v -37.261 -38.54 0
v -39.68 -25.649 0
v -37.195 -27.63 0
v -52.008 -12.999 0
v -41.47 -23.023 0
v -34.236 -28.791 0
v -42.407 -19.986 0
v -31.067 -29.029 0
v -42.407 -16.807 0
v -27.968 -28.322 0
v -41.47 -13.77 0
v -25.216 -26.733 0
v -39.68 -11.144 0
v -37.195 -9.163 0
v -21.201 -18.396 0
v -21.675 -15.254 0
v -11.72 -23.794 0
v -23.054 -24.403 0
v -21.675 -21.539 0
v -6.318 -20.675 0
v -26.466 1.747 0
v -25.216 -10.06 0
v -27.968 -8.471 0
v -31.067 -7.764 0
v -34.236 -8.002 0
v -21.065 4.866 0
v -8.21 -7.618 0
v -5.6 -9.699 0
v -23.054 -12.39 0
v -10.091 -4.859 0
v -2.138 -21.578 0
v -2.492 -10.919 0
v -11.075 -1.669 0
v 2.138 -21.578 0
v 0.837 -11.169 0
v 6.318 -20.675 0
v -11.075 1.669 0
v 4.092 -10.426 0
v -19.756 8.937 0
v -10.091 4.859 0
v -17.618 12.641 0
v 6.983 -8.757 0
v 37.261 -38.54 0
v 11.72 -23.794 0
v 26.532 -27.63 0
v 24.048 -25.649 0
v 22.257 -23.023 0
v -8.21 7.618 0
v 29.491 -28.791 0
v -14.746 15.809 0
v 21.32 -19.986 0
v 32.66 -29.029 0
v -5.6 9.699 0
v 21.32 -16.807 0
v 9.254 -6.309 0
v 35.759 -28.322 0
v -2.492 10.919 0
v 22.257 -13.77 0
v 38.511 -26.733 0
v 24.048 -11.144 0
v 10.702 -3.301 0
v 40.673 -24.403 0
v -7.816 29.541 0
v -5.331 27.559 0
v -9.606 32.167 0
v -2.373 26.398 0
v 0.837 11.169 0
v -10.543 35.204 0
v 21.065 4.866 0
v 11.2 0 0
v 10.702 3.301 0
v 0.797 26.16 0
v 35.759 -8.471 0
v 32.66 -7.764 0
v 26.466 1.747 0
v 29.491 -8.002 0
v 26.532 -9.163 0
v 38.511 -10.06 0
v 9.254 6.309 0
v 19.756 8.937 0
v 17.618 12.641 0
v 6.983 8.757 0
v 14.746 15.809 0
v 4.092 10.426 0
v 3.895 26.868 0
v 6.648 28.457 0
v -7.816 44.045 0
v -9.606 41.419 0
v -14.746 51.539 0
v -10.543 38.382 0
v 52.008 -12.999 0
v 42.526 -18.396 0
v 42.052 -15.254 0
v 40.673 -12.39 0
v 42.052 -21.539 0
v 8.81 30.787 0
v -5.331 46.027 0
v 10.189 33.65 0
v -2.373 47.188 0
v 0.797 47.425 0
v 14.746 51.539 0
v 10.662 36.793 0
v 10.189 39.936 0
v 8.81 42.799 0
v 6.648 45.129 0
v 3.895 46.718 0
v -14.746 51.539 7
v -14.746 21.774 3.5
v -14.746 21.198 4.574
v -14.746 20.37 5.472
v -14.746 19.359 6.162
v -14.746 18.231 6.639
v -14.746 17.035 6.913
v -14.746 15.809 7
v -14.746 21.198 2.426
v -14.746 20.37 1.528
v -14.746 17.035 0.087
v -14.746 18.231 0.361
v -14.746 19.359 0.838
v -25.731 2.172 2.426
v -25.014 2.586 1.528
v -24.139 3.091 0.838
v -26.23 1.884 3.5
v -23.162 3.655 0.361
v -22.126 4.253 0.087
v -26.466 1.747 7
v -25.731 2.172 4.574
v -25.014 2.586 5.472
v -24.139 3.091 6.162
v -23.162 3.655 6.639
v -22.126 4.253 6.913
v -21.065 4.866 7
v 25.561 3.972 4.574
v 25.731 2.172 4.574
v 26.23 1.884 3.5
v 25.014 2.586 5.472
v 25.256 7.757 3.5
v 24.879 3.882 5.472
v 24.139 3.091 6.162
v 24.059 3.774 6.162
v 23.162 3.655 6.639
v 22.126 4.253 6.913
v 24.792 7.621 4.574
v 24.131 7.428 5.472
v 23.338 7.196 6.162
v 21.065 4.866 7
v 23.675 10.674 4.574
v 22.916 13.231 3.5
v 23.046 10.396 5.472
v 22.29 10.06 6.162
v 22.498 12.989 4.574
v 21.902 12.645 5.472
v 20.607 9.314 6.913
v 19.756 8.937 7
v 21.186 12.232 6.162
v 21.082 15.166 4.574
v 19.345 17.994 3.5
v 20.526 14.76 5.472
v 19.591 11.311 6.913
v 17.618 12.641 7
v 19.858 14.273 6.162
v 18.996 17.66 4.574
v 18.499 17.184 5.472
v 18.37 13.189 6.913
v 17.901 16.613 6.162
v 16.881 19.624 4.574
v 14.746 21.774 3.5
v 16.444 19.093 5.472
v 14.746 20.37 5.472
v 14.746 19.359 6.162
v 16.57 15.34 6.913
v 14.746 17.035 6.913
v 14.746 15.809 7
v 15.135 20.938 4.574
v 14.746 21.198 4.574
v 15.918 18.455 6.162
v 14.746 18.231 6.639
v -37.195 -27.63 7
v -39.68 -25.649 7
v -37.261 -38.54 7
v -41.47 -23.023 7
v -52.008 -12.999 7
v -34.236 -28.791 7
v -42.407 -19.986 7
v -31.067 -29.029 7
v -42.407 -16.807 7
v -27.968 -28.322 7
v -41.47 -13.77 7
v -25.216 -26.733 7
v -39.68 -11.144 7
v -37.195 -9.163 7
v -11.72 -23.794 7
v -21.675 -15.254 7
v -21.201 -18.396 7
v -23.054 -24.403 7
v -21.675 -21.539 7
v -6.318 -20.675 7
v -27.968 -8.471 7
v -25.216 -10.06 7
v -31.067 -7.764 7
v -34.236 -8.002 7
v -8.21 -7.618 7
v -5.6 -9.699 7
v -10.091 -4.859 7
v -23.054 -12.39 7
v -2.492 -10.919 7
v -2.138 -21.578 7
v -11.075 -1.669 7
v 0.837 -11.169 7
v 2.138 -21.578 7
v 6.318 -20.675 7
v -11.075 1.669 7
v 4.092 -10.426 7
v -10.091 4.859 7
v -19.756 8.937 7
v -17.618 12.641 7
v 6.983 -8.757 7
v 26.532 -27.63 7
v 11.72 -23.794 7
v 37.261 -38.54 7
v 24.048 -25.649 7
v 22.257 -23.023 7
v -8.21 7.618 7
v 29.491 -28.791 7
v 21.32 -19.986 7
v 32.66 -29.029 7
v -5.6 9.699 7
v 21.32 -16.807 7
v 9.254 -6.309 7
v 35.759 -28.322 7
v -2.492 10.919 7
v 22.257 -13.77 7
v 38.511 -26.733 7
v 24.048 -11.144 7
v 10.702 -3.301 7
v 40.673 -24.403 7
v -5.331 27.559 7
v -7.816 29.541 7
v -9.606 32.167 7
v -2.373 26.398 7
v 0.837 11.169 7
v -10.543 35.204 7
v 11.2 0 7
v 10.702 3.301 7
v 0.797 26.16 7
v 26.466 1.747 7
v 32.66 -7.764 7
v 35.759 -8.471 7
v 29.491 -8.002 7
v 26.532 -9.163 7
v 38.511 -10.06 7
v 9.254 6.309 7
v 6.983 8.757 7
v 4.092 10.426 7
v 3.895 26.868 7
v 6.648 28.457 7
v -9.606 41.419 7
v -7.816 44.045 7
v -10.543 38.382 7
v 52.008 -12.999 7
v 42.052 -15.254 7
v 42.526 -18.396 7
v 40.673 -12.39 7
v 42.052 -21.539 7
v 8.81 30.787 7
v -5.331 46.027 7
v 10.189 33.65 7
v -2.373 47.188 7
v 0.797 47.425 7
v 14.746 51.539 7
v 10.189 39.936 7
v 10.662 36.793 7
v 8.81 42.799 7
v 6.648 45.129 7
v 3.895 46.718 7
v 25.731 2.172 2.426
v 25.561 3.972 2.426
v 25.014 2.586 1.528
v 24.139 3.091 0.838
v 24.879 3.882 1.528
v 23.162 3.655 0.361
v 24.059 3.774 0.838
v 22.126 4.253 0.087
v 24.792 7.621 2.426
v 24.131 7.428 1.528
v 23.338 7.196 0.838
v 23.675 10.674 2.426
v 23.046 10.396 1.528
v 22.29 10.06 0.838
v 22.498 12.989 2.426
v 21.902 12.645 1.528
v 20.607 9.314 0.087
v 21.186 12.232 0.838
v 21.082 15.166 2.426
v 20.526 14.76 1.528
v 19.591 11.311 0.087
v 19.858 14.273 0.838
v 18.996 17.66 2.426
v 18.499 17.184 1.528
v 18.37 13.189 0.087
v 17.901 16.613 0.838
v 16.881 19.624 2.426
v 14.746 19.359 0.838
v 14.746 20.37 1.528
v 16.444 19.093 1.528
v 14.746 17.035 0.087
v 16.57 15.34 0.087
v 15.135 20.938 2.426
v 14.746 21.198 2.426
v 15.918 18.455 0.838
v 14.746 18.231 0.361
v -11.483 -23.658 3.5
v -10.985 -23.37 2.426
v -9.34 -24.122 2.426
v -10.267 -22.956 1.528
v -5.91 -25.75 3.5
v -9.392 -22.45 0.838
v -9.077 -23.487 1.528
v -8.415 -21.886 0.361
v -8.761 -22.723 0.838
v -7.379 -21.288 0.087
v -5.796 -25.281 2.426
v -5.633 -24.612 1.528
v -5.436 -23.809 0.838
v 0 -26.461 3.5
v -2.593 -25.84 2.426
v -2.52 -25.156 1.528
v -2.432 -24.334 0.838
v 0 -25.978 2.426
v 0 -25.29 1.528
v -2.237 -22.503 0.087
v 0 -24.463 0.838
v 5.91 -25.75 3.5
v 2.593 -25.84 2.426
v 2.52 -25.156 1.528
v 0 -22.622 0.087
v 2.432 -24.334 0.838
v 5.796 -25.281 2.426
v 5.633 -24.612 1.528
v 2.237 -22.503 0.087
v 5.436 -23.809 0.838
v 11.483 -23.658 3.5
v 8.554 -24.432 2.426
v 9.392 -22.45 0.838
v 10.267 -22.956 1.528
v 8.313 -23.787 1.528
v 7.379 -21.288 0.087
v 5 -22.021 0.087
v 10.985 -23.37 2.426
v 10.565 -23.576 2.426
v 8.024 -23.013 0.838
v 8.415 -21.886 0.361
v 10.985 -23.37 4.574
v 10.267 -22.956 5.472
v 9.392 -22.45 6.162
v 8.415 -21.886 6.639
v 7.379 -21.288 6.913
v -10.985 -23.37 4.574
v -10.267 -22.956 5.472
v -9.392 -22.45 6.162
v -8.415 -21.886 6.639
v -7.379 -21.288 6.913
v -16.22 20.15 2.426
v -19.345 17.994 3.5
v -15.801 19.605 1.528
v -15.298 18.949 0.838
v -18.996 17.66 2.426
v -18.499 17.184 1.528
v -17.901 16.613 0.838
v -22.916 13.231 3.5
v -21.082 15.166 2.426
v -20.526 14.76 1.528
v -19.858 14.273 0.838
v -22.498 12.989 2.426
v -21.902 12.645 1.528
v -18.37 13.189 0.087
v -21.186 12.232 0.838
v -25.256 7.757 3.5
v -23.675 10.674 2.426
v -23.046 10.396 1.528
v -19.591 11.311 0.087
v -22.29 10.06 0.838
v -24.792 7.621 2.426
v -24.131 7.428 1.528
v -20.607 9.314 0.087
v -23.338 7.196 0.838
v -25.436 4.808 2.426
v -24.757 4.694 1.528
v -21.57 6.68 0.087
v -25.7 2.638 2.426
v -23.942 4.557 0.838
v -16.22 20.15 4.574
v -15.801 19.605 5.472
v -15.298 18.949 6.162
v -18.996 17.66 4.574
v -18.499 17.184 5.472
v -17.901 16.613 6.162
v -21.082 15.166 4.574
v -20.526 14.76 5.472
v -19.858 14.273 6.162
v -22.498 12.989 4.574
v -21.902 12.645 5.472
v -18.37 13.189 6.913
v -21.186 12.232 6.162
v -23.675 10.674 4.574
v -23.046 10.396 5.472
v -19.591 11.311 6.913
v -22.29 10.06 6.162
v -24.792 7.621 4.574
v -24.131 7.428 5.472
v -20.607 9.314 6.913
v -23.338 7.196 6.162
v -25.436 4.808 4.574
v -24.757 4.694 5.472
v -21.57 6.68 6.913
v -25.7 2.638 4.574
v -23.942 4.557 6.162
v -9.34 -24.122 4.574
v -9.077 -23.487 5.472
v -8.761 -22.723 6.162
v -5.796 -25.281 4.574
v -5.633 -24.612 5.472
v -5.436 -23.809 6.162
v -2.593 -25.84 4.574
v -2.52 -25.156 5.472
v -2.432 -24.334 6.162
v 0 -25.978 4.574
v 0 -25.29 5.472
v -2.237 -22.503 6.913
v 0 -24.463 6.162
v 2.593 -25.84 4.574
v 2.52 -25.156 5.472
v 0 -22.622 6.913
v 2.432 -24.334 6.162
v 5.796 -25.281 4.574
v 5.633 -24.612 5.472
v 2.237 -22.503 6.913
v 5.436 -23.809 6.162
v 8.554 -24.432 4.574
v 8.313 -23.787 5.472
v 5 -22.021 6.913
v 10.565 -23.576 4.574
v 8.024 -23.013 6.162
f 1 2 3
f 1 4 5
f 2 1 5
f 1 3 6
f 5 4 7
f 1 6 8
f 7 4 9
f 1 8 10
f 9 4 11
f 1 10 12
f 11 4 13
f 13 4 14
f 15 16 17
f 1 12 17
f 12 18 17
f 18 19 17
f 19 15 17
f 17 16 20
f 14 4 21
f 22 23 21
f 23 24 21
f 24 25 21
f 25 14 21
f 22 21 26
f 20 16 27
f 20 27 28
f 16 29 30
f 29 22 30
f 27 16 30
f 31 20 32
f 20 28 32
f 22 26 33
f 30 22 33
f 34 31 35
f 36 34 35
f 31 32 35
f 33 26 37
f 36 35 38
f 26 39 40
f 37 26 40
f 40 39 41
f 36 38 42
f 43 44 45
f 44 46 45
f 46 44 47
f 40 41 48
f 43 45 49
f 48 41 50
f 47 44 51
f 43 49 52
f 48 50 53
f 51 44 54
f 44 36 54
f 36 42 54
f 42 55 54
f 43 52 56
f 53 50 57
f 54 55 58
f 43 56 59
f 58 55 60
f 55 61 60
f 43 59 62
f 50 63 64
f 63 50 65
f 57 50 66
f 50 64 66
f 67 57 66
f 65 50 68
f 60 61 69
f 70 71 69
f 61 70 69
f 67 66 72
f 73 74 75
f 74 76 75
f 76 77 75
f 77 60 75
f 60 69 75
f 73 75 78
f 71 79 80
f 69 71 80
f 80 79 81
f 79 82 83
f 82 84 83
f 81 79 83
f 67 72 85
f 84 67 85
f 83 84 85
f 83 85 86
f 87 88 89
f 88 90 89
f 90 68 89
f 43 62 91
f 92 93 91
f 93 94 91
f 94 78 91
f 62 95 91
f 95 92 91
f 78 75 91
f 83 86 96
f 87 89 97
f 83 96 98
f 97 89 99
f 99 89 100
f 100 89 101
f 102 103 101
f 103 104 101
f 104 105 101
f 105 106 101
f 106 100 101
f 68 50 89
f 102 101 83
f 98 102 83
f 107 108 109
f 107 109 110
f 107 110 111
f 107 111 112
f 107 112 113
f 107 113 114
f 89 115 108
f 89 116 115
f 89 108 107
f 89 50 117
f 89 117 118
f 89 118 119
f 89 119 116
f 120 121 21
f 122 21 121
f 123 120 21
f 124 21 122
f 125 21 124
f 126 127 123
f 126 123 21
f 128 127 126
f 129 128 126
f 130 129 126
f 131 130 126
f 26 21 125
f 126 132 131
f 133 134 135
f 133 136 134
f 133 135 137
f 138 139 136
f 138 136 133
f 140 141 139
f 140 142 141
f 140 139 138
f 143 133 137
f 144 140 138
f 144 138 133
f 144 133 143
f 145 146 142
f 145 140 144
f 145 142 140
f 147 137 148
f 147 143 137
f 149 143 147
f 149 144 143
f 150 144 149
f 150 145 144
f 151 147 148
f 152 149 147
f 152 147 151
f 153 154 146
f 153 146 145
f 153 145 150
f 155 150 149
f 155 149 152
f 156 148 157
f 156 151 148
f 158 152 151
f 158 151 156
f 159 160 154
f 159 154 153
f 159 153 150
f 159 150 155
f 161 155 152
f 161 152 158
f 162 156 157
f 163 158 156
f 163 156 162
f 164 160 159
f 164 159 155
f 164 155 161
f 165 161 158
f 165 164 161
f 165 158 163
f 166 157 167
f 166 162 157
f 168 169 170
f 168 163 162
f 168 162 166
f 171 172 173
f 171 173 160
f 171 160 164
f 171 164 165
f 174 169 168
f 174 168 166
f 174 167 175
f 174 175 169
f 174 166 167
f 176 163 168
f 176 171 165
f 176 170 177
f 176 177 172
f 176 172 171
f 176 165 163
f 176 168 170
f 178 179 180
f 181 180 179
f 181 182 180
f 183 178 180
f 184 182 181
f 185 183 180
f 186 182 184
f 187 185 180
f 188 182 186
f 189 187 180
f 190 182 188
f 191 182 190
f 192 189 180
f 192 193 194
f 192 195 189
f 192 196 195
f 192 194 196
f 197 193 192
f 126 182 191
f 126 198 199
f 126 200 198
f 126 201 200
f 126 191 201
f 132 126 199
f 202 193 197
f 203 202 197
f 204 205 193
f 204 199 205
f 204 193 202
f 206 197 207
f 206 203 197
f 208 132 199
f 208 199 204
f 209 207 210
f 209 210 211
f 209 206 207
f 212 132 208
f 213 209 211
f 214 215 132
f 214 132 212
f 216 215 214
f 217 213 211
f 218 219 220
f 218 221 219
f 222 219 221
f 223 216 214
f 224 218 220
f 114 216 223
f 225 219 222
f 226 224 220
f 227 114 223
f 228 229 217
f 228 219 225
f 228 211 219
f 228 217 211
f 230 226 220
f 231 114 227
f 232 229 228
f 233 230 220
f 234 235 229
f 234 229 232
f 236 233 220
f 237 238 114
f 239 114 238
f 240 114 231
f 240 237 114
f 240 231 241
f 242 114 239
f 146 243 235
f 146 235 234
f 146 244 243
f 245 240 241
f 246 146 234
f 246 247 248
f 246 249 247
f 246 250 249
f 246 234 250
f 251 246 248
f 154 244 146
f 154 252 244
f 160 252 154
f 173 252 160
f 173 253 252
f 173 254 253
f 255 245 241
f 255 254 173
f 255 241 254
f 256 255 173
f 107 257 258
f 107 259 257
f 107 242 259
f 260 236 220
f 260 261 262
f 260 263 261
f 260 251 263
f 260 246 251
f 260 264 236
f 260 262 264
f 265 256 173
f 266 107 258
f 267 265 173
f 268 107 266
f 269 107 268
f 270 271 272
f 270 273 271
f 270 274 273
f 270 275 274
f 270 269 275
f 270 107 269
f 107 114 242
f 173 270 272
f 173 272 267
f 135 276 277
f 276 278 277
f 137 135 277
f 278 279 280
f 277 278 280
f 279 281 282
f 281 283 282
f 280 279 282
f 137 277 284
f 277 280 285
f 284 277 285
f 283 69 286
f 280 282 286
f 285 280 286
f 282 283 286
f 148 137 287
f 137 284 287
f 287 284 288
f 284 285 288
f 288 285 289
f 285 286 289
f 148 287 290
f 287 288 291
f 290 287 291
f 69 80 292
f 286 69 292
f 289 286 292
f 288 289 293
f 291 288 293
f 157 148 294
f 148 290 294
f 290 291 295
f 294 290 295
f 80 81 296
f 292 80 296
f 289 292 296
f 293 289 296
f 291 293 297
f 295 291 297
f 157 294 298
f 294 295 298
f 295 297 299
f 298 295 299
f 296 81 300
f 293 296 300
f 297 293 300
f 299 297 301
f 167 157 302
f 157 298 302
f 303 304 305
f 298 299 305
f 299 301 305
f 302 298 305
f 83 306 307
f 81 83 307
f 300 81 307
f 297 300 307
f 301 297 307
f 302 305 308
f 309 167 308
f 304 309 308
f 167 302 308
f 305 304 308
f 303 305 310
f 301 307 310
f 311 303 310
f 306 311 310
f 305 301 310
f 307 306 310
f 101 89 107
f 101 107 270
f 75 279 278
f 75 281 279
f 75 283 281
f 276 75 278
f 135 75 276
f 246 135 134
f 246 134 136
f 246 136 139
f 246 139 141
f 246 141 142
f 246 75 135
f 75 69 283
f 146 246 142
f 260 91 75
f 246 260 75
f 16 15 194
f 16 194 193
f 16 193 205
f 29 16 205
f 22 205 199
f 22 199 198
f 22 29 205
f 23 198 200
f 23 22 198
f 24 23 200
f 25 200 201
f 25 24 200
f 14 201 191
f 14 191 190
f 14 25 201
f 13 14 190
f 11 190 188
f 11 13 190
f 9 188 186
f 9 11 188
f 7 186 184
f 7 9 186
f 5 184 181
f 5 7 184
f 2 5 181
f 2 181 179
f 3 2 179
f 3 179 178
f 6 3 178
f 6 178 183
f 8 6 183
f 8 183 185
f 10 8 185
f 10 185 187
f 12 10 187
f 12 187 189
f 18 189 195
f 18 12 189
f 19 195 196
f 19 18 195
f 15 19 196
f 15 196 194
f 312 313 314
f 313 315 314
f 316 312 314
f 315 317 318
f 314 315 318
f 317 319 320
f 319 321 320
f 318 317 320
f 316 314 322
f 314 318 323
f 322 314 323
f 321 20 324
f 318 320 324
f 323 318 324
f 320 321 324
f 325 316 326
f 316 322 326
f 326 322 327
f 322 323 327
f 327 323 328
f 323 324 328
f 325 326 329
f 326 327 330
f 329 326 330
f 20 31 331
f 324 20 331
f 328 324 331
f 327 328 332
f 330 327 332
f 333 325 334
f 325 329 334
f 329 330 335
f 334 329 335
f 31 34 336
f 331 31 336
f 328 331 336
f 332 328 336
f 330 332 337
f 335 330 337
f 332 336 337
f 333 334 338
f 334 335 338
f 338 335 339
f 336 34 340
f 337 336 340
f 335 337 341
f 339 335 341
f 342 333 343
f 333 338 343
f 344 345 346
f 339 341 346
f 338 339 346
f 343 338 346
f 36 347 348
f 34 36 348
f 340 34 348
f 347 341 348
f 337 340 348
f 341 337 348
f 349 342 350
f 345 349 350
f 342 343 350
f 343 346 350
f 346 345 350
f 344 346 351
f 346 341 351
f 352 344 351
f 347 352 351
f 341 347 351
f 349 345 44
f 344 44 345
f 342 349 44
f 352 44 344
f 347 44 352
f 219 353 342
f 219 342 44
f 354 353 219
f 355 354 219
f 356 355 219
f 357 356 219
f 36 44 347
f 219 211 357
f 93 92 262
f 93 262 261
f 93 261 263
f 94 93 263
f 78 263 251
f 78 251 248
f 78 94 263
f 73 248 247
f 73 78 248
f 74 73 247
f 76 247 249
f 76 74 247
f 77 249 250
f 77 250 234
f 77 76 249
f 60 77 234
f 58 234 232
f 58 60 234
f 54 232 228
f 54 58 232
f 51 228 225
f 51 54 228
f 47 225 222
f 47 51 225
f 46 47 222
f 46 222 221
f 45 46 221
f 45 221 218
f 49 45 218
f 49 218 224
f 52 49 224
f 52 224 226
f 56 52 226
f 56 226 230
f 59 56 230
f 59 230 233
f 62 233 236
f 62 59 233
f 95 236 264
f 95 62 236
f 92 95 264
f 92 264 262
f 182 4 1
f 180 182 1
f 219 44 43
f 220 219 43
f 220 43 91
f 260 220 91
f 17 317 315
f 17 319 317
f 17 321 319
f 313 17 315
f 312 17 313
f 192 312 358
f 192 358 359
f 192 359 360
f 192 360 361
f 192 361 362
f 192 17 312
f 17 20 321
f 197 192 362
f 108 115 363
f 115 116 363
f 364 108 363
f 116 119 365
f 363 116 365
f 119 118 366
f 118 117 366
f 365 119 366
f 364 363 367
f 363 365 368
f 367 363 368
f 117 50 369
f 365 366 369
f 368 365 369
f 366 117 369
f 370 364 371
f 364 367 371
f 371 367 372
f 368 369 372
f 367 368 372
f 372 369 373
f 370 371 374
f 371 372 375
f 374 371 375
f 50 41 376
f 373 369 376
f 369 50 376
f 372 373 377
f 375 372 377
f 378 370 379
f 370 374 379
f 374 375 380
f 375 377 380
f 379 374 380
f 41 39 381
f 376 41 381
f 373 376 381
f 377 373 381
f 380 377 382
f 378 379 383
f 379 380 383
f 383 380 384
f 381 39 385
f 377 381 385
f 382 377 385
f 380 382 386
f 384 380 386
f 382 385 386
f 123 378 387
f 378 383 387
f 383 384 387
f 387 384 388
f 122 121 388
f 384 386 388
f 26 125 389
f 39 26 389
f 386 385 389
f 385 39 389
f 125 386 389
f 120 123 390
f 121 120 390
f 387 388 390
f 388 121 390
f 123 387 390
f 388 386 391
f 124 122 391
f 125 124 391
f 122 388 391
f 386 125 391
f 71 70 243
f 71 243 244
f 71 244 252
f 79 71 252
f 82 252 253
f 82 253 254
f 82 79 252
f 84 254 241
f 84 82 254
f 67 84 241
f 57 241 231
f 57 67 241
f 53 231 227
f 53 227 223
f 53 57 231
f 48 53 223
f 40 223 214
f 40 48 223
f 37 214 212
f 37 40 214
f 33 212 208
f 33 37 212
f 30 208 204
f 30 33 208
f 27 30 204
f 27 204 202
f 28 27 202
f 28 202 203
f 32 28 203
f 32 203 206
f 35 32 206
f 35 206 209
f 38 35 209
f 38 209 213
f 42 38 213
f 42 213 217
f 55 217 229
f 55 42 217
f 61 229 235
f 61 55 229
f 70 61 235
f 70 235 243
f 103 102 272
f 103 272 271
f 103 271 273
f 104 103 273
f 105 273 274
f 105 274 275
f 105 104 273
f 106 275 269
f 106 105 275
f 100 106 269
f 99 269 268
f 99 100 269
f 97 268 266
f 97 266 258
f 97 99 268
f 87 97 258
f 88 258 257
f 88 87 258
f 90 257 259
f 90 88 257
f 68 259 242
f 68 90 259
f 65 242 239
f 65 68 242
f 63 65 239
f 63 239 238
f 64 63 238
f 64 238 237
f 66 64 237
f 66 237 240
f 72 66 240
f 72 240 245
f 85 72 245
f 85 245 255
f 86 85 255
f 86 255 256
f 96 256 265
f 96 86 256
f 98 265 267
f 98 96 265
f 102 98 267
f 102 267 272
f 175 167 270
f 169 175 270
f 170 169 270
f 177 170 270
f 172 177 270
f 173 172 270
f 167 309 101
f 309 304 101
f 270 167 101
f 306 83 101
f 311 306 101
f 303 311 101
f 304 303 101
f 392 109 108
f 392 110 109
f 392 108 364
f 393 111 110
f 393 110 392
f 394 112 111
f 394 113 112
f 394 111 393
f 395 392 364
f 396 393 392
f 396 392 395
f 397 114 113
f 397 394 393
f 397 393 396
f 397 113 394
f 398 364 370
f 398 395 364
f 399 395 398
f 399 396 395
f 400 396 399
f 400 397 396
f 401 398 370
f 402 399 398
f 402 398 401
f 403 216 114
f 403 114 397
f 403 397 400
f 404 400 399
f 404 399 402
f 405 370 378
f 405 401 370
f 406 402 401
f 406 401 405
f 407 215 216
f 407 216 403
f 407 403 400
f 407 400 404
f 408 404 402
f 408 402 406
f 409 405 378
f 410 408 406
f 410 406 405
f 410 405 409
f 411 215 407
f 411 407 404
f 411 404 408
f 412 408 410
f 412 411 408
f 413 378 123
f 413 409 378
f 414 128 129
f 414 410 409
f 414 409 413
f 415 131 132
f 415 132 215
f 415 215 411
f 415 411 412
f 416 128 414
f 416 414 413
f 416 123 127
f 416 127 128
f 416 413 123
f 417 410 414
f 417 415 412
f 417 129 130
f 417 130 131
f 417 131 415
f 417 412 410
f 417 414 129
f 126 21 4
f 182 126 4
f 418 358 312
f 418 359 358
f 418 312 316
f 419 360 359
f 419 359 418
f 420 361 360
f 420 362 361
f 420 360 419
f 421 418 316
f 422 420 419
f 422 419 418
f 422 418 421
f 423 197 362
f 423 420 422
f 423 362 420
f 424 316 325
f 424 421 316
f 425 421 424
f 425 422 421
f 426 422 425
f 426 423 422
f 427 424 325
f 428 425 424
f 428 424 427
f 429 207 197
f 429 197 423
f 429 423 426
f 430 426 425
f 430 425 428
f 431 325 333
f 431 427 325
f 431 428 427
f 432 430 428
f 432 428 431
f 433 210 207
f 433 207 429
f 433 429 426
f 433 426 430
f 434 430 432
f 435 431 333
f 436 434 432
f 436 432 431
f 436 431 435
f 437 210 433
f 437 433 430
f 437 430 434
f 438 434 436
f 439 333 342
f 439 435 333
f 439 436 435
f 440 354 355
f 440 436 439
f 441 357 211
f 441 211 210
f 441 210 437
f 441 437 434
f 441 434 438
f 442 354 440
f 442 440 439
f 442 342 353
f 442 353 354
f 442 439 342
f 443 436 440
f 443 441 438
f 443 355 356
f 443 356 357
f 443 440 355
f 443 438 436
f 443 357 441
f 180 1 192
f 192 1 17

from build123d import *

# Parameters (mm, degrees)
F0_W         = 29.492739588
F0_H         = 29.492739588
F0_R         = 10.6622653611
F0_R_2       = 13.2
F0_R_3       = 11.2
F1_DEPTH     = 7
F2_T4_ANGLE  = 112.5181364767
F2_T10_ANGLE = 112.5181364767
F2_T16_ANGLE = 112.5181364767
F2_T22_ANGLE = 112.5181364767
F2_T28_ANGLE = 112.5181364767
F2_T34_ANGLE = 112.5181364767


# Not quite as in the source:
# - a fillet or chamfer that OpenCascade refuses, or shapes differently, is made with other operations: its cross-section is extruded or revolved along the edge and cut away or added


with BuildPart() as f1:
    # F0 (on Top) → F1 (new body)
    with BuildSketch(Plane.XY):
        with Locations((0, 36.7929209024)):
            Rectangle(F0_W, F0_H)
        with Locations((0, 36.7929209024)):
            Circle(F0_R, mode=Mode.SUBTRACT)
        with BuildLine():
            Line((14.746369794, 22.0465511084), (-14.746369794, 22.0465511084))
            ThreePointArc((-14.746369794, 22.0465511084), (-23.115726428, 13.3458708757), (-26.4660582227, 1.747455301))
            Line((-26.4660582227, 1.747455301), (-11.7196884287, -23.7940064094))
            ThreePointArc((-11.7196884287, -23.7940064094), (0, -26.6917417515), (11.7196884287, -23.7940064094))
            Line((11.7196884287, -23.7940064094), (26.4660582227, 1.747455301))
            ThreePointArc((26.4660582227, 1.747455301), (23.115726428, 13.3458708757), (14.746369794, 22.0465511084))
        make_face()
        Circle(F0_R_2, mode=Mode.SUBTRACT)
        Polygon((52.0075199331, -12.998914493), (26.4660582227, 1.747455301), (11.7196884287, -23.7940064094), (37.2611501391, -38.5403762034), align=None)
        with Locations((31.8636041809, -18.3964604512)):
            Circle(F0_R, mode=Mode.SUBTRACT)
        Polygon((-11.7196884287, -23.7940064094), (-26.4660582227, 1.747455301), (-52.0075199331, -12.998914493), (-37.2611501391, -38.5403762034), align=None)
        with Locations((-31.8636041809, -18.3964604512)):
            Circle(F0_R, mode=Mode.SUBTRACT)
        Circle(F0_R_2)
        Circle(F0_R_3, mode=Mode.SUBTRACT)
    extrude(amount=F1_DEPTH)

    # F2: fillet of radius 5 on 6 edges, made by hand


with BuildPart() as f2_tool2:
    # F2_s3 → F2_t4 (revolve)
    with BuildSketch(Plane(origin=(-1.2804779727, -0.0837234298, 0), x_dir=(0, 0, 1), z_dir=(0.9978692621, 0.0652451967, 0))):
        with BuildLine():
            ThreePointArc((2, -26.0057199962), (5.5355339059, -24.5412539021), (7, -21.0057199962))
            Line((7, -21.0057199962), (7, -26.0057199962))
            Line((7, -26.0057199962), (2, -26.0057199962))
        make_face()
    revolve(axis=Axis((-1.336401015, 0.7715714858, 7), (0, 0, 1)), revolution_arc=F2_T4_ANGLE)

    split(bisect_by=Plane.YZ.offset(-14.746369794), keep=Keep.BOTTOM)

    split(bisect_by=Plane(origin=(-7.373184897, 12.7707308552, 0), x_dir=(0, 0, 1), z_dir=(-0.5, 0.8660254038, 0)), keep=Keep.TOP)


with BuildPart() as f1_1:
    add(f1.part)

    # F2_t1: cut F2_tool2
    add(f2_tool2.part, mode=Mode.SUBTRACT)


with BuildPart() as f2_tool8:
    # F2_s9 → F2_t10 (revolve)
    with BuildSketch(Plane(origin=(0.5677323692, 1.1507881683, 0), x_dir=(0, 0, 1), z_dir=(-0.4424306333, -0.896802729, 0))):
        with BuildLine():
            ThreePointArc((2, -26.0057199962), (5.5355339059, -24.5412539021), (7, -21.0057199962))
            Line((7, -21.0057199962), (7, -26.0057199962))
            Line((7, -26.0057199962), (2, -26.0057199962))
        make_face()
    revolve(axis=Axis((1.336401015, 0.7715714858, 7), (0, 0, 1)), revolution_arc=F2_T10_ANGLE)

    split(bisect_by=Plane(origin=(7.373184897, 12.7707308552, 0), x_dir=(0, 0, 1), z_dir=(0.5, 0.8660254038, 0)), keep=Keep.TOP)

    split(bisect_by=Plane.YZ.offset(14.746369794), keep=Keep.TOP)


with BuildPart() as f1_2:
    add(f1_1.part)

    # F2_t7: cut F2_tool8
    add(f2_tool8.part, mode=Mode.SUBTRACT)


with BuildPart() as f2_tool14:
    # F2_s15 → F2_t16 (revolve)
    with BuildSketch(Plane(origin=(0.7127456035, -1.0670647384, 0), x_dir=(0, 0, 1), z_dir=(-0.5554386289, 0.8315575323, 0))):
        with BuildLine():
            ThreePointArc((2, -26.0057199962), (5.5355339059, -24.5412539021), (7, -21.0057199962))
            Line((7, -21.0057199962), (7, -26.0057199962))
            Line((7, -26.0057199962), (2, -26.0057199962))
        make_face()
    revolve(axis=Axis((0, -1.5431429715, 7), (0, 0, 1)), revolution_arc=F2_T16_ANGLE)

    split(bisect_by=Plane(origin=(7.373184897, -12.7707308552, 0), x_dir=(0, 0, 1), z_dir=(0.5, -0.8660254038, 0)), keep=Keep.TOP)

    split(bisect_by=Plane(origin=(-7.373184897, -12.7707308552, 0), x_dir=(0, 0, 1), z_dir=(-0.5, -0.8660254038, 0)), keep=Keep.TOP)


with BuildPart() as f1_3:
    add(f1_2.part)

    # F2_t13: cut F2_tool14
    add(f2_tool14.part, mode=Mode.SUBTRACT)


with BuildPart() as f2_tool20:
    # F2_s21 → F2_t22 (revolve)
    with BuildSketch(Plane(origin=(0.5677323692, 1.1507881683, 0), x_dir=(0, 0, 1), z_dir=(-0.4424306333, -0.896802729, 0))):
        with BuildLine():
            ThreePointArc((5, -26.0057199962), (1.4644660941, -24.5412539021), (0, -21.0057199962))
            Line((0, -21.0057199962), (0, -26.0057199962))
            Line((0, -26.0057199962), (5, -26.0057199962))
        make_face()
    revolve(axis=Axis((1.336401015, 0.7715714858, 0), (0, 0, 1)), revolution_arc=F2_T22_ANGLE)

    split(bisect_by=Plane(origin=(7.373184897, 12.7707308552, 0), x_dir=(0, 0, 1), z_dir=(0.5, 0.8660254038, 0)), keep=Keep.TOP)

    split(bisect_by=Plane.YZ.offset(14.746369794), keep=Keep.TOP)


with BuildPart() as f1_4:
    add(f1_3.part)

    # F2_t19: cut F2_tool20
    add(f2_tool20.part, mode=Mode.SUBTRACT)


with BuildPart() as f2_tool26:
    # F2_s27 → F2_t28 (revolve)
    with BuildSketch(Plane(origin=(0.7127456035, -1.0670647384, 0), x_dir=(0, 0, 1), z_dir=(-0.5554386289, 0.8315575323, 0))):
        with BuildLine():
            ThreePointArc((5, -26.0057199962), (1.4644660941, -24.5412539021), (0, -21.0057199962))
            Line((0, -21.0057199962), (0, -26.0057199962))
            Line((0, -26.0057199962), (5, -26.0057199962))
        make_face()
    revolve(axis=Axis((0, -1.5431429715, 0), (0, 0, 1)), revolution_arc=F2_T28_ANGLE)

    split(bisect_by=Plane(origin=(7.373184897, -12.7707308552, 0), x_dir=(0, 0, 1), z_dir=(0.5, -0.8660254038, 0)), keep=Keep.TOP)

    split(bisect_by=Plane(origin=(-7.373184897, -12.7707308552, 0), x_dir=(0, 0, 1), z_dir=(-0.5, -0.8660254038, 0)), keep=Keep.TOP)


with BuildPart() as f1_5:
    add(f1_4.part)

    # F2_t25: cut F2_tool26
    add(f2_tool26.part, mode=Mode.SUBTRACT)


with BuildPart() as f2_tool32:
    # F2_s33 → F2_t34 (revolve)
    with BuildSketch(Plane(origin=(-1.2804779727, -0.0837234298, 0), x_dir=(0, 0, 1), z_dir=(0.9978692621, 0.0652451967, 0))):
        with BuildLine():
            ThreePointArc((5, -26.0057199962), (1.4644660941, -24.5412539021), (0, -21.0057199962))
            Line((0, -21.0057199962), (0, -26.0057199962))
            Line((0, -26.0057199962), (5, -26.0057199962))
        make_face()
    revolve(axis=Axis((-1.336401015, 0.7715714858, 0), (0, 0, 1)), revolution_arc=F2_T34_ANGLE)

    split(bisect_by=Plane.YZ.offset(-14.746369794), keep=Keep.BOTTOM)

    split(bisect_by=Plane(origin=(-7.373184897, 12.7707308552, 0), x_dir=(0, 0, 1), z_dir=(-0.5, 0.8660254038, 0)), keep=Keep.TOP)


with BuildPart() as f1_6:
    add(f1_5.part)

    # F2_t31: cut F2_tool32
    add(f2_tool32.part, mode=Mode.SUBTRACT)


solid = f1_6.part
